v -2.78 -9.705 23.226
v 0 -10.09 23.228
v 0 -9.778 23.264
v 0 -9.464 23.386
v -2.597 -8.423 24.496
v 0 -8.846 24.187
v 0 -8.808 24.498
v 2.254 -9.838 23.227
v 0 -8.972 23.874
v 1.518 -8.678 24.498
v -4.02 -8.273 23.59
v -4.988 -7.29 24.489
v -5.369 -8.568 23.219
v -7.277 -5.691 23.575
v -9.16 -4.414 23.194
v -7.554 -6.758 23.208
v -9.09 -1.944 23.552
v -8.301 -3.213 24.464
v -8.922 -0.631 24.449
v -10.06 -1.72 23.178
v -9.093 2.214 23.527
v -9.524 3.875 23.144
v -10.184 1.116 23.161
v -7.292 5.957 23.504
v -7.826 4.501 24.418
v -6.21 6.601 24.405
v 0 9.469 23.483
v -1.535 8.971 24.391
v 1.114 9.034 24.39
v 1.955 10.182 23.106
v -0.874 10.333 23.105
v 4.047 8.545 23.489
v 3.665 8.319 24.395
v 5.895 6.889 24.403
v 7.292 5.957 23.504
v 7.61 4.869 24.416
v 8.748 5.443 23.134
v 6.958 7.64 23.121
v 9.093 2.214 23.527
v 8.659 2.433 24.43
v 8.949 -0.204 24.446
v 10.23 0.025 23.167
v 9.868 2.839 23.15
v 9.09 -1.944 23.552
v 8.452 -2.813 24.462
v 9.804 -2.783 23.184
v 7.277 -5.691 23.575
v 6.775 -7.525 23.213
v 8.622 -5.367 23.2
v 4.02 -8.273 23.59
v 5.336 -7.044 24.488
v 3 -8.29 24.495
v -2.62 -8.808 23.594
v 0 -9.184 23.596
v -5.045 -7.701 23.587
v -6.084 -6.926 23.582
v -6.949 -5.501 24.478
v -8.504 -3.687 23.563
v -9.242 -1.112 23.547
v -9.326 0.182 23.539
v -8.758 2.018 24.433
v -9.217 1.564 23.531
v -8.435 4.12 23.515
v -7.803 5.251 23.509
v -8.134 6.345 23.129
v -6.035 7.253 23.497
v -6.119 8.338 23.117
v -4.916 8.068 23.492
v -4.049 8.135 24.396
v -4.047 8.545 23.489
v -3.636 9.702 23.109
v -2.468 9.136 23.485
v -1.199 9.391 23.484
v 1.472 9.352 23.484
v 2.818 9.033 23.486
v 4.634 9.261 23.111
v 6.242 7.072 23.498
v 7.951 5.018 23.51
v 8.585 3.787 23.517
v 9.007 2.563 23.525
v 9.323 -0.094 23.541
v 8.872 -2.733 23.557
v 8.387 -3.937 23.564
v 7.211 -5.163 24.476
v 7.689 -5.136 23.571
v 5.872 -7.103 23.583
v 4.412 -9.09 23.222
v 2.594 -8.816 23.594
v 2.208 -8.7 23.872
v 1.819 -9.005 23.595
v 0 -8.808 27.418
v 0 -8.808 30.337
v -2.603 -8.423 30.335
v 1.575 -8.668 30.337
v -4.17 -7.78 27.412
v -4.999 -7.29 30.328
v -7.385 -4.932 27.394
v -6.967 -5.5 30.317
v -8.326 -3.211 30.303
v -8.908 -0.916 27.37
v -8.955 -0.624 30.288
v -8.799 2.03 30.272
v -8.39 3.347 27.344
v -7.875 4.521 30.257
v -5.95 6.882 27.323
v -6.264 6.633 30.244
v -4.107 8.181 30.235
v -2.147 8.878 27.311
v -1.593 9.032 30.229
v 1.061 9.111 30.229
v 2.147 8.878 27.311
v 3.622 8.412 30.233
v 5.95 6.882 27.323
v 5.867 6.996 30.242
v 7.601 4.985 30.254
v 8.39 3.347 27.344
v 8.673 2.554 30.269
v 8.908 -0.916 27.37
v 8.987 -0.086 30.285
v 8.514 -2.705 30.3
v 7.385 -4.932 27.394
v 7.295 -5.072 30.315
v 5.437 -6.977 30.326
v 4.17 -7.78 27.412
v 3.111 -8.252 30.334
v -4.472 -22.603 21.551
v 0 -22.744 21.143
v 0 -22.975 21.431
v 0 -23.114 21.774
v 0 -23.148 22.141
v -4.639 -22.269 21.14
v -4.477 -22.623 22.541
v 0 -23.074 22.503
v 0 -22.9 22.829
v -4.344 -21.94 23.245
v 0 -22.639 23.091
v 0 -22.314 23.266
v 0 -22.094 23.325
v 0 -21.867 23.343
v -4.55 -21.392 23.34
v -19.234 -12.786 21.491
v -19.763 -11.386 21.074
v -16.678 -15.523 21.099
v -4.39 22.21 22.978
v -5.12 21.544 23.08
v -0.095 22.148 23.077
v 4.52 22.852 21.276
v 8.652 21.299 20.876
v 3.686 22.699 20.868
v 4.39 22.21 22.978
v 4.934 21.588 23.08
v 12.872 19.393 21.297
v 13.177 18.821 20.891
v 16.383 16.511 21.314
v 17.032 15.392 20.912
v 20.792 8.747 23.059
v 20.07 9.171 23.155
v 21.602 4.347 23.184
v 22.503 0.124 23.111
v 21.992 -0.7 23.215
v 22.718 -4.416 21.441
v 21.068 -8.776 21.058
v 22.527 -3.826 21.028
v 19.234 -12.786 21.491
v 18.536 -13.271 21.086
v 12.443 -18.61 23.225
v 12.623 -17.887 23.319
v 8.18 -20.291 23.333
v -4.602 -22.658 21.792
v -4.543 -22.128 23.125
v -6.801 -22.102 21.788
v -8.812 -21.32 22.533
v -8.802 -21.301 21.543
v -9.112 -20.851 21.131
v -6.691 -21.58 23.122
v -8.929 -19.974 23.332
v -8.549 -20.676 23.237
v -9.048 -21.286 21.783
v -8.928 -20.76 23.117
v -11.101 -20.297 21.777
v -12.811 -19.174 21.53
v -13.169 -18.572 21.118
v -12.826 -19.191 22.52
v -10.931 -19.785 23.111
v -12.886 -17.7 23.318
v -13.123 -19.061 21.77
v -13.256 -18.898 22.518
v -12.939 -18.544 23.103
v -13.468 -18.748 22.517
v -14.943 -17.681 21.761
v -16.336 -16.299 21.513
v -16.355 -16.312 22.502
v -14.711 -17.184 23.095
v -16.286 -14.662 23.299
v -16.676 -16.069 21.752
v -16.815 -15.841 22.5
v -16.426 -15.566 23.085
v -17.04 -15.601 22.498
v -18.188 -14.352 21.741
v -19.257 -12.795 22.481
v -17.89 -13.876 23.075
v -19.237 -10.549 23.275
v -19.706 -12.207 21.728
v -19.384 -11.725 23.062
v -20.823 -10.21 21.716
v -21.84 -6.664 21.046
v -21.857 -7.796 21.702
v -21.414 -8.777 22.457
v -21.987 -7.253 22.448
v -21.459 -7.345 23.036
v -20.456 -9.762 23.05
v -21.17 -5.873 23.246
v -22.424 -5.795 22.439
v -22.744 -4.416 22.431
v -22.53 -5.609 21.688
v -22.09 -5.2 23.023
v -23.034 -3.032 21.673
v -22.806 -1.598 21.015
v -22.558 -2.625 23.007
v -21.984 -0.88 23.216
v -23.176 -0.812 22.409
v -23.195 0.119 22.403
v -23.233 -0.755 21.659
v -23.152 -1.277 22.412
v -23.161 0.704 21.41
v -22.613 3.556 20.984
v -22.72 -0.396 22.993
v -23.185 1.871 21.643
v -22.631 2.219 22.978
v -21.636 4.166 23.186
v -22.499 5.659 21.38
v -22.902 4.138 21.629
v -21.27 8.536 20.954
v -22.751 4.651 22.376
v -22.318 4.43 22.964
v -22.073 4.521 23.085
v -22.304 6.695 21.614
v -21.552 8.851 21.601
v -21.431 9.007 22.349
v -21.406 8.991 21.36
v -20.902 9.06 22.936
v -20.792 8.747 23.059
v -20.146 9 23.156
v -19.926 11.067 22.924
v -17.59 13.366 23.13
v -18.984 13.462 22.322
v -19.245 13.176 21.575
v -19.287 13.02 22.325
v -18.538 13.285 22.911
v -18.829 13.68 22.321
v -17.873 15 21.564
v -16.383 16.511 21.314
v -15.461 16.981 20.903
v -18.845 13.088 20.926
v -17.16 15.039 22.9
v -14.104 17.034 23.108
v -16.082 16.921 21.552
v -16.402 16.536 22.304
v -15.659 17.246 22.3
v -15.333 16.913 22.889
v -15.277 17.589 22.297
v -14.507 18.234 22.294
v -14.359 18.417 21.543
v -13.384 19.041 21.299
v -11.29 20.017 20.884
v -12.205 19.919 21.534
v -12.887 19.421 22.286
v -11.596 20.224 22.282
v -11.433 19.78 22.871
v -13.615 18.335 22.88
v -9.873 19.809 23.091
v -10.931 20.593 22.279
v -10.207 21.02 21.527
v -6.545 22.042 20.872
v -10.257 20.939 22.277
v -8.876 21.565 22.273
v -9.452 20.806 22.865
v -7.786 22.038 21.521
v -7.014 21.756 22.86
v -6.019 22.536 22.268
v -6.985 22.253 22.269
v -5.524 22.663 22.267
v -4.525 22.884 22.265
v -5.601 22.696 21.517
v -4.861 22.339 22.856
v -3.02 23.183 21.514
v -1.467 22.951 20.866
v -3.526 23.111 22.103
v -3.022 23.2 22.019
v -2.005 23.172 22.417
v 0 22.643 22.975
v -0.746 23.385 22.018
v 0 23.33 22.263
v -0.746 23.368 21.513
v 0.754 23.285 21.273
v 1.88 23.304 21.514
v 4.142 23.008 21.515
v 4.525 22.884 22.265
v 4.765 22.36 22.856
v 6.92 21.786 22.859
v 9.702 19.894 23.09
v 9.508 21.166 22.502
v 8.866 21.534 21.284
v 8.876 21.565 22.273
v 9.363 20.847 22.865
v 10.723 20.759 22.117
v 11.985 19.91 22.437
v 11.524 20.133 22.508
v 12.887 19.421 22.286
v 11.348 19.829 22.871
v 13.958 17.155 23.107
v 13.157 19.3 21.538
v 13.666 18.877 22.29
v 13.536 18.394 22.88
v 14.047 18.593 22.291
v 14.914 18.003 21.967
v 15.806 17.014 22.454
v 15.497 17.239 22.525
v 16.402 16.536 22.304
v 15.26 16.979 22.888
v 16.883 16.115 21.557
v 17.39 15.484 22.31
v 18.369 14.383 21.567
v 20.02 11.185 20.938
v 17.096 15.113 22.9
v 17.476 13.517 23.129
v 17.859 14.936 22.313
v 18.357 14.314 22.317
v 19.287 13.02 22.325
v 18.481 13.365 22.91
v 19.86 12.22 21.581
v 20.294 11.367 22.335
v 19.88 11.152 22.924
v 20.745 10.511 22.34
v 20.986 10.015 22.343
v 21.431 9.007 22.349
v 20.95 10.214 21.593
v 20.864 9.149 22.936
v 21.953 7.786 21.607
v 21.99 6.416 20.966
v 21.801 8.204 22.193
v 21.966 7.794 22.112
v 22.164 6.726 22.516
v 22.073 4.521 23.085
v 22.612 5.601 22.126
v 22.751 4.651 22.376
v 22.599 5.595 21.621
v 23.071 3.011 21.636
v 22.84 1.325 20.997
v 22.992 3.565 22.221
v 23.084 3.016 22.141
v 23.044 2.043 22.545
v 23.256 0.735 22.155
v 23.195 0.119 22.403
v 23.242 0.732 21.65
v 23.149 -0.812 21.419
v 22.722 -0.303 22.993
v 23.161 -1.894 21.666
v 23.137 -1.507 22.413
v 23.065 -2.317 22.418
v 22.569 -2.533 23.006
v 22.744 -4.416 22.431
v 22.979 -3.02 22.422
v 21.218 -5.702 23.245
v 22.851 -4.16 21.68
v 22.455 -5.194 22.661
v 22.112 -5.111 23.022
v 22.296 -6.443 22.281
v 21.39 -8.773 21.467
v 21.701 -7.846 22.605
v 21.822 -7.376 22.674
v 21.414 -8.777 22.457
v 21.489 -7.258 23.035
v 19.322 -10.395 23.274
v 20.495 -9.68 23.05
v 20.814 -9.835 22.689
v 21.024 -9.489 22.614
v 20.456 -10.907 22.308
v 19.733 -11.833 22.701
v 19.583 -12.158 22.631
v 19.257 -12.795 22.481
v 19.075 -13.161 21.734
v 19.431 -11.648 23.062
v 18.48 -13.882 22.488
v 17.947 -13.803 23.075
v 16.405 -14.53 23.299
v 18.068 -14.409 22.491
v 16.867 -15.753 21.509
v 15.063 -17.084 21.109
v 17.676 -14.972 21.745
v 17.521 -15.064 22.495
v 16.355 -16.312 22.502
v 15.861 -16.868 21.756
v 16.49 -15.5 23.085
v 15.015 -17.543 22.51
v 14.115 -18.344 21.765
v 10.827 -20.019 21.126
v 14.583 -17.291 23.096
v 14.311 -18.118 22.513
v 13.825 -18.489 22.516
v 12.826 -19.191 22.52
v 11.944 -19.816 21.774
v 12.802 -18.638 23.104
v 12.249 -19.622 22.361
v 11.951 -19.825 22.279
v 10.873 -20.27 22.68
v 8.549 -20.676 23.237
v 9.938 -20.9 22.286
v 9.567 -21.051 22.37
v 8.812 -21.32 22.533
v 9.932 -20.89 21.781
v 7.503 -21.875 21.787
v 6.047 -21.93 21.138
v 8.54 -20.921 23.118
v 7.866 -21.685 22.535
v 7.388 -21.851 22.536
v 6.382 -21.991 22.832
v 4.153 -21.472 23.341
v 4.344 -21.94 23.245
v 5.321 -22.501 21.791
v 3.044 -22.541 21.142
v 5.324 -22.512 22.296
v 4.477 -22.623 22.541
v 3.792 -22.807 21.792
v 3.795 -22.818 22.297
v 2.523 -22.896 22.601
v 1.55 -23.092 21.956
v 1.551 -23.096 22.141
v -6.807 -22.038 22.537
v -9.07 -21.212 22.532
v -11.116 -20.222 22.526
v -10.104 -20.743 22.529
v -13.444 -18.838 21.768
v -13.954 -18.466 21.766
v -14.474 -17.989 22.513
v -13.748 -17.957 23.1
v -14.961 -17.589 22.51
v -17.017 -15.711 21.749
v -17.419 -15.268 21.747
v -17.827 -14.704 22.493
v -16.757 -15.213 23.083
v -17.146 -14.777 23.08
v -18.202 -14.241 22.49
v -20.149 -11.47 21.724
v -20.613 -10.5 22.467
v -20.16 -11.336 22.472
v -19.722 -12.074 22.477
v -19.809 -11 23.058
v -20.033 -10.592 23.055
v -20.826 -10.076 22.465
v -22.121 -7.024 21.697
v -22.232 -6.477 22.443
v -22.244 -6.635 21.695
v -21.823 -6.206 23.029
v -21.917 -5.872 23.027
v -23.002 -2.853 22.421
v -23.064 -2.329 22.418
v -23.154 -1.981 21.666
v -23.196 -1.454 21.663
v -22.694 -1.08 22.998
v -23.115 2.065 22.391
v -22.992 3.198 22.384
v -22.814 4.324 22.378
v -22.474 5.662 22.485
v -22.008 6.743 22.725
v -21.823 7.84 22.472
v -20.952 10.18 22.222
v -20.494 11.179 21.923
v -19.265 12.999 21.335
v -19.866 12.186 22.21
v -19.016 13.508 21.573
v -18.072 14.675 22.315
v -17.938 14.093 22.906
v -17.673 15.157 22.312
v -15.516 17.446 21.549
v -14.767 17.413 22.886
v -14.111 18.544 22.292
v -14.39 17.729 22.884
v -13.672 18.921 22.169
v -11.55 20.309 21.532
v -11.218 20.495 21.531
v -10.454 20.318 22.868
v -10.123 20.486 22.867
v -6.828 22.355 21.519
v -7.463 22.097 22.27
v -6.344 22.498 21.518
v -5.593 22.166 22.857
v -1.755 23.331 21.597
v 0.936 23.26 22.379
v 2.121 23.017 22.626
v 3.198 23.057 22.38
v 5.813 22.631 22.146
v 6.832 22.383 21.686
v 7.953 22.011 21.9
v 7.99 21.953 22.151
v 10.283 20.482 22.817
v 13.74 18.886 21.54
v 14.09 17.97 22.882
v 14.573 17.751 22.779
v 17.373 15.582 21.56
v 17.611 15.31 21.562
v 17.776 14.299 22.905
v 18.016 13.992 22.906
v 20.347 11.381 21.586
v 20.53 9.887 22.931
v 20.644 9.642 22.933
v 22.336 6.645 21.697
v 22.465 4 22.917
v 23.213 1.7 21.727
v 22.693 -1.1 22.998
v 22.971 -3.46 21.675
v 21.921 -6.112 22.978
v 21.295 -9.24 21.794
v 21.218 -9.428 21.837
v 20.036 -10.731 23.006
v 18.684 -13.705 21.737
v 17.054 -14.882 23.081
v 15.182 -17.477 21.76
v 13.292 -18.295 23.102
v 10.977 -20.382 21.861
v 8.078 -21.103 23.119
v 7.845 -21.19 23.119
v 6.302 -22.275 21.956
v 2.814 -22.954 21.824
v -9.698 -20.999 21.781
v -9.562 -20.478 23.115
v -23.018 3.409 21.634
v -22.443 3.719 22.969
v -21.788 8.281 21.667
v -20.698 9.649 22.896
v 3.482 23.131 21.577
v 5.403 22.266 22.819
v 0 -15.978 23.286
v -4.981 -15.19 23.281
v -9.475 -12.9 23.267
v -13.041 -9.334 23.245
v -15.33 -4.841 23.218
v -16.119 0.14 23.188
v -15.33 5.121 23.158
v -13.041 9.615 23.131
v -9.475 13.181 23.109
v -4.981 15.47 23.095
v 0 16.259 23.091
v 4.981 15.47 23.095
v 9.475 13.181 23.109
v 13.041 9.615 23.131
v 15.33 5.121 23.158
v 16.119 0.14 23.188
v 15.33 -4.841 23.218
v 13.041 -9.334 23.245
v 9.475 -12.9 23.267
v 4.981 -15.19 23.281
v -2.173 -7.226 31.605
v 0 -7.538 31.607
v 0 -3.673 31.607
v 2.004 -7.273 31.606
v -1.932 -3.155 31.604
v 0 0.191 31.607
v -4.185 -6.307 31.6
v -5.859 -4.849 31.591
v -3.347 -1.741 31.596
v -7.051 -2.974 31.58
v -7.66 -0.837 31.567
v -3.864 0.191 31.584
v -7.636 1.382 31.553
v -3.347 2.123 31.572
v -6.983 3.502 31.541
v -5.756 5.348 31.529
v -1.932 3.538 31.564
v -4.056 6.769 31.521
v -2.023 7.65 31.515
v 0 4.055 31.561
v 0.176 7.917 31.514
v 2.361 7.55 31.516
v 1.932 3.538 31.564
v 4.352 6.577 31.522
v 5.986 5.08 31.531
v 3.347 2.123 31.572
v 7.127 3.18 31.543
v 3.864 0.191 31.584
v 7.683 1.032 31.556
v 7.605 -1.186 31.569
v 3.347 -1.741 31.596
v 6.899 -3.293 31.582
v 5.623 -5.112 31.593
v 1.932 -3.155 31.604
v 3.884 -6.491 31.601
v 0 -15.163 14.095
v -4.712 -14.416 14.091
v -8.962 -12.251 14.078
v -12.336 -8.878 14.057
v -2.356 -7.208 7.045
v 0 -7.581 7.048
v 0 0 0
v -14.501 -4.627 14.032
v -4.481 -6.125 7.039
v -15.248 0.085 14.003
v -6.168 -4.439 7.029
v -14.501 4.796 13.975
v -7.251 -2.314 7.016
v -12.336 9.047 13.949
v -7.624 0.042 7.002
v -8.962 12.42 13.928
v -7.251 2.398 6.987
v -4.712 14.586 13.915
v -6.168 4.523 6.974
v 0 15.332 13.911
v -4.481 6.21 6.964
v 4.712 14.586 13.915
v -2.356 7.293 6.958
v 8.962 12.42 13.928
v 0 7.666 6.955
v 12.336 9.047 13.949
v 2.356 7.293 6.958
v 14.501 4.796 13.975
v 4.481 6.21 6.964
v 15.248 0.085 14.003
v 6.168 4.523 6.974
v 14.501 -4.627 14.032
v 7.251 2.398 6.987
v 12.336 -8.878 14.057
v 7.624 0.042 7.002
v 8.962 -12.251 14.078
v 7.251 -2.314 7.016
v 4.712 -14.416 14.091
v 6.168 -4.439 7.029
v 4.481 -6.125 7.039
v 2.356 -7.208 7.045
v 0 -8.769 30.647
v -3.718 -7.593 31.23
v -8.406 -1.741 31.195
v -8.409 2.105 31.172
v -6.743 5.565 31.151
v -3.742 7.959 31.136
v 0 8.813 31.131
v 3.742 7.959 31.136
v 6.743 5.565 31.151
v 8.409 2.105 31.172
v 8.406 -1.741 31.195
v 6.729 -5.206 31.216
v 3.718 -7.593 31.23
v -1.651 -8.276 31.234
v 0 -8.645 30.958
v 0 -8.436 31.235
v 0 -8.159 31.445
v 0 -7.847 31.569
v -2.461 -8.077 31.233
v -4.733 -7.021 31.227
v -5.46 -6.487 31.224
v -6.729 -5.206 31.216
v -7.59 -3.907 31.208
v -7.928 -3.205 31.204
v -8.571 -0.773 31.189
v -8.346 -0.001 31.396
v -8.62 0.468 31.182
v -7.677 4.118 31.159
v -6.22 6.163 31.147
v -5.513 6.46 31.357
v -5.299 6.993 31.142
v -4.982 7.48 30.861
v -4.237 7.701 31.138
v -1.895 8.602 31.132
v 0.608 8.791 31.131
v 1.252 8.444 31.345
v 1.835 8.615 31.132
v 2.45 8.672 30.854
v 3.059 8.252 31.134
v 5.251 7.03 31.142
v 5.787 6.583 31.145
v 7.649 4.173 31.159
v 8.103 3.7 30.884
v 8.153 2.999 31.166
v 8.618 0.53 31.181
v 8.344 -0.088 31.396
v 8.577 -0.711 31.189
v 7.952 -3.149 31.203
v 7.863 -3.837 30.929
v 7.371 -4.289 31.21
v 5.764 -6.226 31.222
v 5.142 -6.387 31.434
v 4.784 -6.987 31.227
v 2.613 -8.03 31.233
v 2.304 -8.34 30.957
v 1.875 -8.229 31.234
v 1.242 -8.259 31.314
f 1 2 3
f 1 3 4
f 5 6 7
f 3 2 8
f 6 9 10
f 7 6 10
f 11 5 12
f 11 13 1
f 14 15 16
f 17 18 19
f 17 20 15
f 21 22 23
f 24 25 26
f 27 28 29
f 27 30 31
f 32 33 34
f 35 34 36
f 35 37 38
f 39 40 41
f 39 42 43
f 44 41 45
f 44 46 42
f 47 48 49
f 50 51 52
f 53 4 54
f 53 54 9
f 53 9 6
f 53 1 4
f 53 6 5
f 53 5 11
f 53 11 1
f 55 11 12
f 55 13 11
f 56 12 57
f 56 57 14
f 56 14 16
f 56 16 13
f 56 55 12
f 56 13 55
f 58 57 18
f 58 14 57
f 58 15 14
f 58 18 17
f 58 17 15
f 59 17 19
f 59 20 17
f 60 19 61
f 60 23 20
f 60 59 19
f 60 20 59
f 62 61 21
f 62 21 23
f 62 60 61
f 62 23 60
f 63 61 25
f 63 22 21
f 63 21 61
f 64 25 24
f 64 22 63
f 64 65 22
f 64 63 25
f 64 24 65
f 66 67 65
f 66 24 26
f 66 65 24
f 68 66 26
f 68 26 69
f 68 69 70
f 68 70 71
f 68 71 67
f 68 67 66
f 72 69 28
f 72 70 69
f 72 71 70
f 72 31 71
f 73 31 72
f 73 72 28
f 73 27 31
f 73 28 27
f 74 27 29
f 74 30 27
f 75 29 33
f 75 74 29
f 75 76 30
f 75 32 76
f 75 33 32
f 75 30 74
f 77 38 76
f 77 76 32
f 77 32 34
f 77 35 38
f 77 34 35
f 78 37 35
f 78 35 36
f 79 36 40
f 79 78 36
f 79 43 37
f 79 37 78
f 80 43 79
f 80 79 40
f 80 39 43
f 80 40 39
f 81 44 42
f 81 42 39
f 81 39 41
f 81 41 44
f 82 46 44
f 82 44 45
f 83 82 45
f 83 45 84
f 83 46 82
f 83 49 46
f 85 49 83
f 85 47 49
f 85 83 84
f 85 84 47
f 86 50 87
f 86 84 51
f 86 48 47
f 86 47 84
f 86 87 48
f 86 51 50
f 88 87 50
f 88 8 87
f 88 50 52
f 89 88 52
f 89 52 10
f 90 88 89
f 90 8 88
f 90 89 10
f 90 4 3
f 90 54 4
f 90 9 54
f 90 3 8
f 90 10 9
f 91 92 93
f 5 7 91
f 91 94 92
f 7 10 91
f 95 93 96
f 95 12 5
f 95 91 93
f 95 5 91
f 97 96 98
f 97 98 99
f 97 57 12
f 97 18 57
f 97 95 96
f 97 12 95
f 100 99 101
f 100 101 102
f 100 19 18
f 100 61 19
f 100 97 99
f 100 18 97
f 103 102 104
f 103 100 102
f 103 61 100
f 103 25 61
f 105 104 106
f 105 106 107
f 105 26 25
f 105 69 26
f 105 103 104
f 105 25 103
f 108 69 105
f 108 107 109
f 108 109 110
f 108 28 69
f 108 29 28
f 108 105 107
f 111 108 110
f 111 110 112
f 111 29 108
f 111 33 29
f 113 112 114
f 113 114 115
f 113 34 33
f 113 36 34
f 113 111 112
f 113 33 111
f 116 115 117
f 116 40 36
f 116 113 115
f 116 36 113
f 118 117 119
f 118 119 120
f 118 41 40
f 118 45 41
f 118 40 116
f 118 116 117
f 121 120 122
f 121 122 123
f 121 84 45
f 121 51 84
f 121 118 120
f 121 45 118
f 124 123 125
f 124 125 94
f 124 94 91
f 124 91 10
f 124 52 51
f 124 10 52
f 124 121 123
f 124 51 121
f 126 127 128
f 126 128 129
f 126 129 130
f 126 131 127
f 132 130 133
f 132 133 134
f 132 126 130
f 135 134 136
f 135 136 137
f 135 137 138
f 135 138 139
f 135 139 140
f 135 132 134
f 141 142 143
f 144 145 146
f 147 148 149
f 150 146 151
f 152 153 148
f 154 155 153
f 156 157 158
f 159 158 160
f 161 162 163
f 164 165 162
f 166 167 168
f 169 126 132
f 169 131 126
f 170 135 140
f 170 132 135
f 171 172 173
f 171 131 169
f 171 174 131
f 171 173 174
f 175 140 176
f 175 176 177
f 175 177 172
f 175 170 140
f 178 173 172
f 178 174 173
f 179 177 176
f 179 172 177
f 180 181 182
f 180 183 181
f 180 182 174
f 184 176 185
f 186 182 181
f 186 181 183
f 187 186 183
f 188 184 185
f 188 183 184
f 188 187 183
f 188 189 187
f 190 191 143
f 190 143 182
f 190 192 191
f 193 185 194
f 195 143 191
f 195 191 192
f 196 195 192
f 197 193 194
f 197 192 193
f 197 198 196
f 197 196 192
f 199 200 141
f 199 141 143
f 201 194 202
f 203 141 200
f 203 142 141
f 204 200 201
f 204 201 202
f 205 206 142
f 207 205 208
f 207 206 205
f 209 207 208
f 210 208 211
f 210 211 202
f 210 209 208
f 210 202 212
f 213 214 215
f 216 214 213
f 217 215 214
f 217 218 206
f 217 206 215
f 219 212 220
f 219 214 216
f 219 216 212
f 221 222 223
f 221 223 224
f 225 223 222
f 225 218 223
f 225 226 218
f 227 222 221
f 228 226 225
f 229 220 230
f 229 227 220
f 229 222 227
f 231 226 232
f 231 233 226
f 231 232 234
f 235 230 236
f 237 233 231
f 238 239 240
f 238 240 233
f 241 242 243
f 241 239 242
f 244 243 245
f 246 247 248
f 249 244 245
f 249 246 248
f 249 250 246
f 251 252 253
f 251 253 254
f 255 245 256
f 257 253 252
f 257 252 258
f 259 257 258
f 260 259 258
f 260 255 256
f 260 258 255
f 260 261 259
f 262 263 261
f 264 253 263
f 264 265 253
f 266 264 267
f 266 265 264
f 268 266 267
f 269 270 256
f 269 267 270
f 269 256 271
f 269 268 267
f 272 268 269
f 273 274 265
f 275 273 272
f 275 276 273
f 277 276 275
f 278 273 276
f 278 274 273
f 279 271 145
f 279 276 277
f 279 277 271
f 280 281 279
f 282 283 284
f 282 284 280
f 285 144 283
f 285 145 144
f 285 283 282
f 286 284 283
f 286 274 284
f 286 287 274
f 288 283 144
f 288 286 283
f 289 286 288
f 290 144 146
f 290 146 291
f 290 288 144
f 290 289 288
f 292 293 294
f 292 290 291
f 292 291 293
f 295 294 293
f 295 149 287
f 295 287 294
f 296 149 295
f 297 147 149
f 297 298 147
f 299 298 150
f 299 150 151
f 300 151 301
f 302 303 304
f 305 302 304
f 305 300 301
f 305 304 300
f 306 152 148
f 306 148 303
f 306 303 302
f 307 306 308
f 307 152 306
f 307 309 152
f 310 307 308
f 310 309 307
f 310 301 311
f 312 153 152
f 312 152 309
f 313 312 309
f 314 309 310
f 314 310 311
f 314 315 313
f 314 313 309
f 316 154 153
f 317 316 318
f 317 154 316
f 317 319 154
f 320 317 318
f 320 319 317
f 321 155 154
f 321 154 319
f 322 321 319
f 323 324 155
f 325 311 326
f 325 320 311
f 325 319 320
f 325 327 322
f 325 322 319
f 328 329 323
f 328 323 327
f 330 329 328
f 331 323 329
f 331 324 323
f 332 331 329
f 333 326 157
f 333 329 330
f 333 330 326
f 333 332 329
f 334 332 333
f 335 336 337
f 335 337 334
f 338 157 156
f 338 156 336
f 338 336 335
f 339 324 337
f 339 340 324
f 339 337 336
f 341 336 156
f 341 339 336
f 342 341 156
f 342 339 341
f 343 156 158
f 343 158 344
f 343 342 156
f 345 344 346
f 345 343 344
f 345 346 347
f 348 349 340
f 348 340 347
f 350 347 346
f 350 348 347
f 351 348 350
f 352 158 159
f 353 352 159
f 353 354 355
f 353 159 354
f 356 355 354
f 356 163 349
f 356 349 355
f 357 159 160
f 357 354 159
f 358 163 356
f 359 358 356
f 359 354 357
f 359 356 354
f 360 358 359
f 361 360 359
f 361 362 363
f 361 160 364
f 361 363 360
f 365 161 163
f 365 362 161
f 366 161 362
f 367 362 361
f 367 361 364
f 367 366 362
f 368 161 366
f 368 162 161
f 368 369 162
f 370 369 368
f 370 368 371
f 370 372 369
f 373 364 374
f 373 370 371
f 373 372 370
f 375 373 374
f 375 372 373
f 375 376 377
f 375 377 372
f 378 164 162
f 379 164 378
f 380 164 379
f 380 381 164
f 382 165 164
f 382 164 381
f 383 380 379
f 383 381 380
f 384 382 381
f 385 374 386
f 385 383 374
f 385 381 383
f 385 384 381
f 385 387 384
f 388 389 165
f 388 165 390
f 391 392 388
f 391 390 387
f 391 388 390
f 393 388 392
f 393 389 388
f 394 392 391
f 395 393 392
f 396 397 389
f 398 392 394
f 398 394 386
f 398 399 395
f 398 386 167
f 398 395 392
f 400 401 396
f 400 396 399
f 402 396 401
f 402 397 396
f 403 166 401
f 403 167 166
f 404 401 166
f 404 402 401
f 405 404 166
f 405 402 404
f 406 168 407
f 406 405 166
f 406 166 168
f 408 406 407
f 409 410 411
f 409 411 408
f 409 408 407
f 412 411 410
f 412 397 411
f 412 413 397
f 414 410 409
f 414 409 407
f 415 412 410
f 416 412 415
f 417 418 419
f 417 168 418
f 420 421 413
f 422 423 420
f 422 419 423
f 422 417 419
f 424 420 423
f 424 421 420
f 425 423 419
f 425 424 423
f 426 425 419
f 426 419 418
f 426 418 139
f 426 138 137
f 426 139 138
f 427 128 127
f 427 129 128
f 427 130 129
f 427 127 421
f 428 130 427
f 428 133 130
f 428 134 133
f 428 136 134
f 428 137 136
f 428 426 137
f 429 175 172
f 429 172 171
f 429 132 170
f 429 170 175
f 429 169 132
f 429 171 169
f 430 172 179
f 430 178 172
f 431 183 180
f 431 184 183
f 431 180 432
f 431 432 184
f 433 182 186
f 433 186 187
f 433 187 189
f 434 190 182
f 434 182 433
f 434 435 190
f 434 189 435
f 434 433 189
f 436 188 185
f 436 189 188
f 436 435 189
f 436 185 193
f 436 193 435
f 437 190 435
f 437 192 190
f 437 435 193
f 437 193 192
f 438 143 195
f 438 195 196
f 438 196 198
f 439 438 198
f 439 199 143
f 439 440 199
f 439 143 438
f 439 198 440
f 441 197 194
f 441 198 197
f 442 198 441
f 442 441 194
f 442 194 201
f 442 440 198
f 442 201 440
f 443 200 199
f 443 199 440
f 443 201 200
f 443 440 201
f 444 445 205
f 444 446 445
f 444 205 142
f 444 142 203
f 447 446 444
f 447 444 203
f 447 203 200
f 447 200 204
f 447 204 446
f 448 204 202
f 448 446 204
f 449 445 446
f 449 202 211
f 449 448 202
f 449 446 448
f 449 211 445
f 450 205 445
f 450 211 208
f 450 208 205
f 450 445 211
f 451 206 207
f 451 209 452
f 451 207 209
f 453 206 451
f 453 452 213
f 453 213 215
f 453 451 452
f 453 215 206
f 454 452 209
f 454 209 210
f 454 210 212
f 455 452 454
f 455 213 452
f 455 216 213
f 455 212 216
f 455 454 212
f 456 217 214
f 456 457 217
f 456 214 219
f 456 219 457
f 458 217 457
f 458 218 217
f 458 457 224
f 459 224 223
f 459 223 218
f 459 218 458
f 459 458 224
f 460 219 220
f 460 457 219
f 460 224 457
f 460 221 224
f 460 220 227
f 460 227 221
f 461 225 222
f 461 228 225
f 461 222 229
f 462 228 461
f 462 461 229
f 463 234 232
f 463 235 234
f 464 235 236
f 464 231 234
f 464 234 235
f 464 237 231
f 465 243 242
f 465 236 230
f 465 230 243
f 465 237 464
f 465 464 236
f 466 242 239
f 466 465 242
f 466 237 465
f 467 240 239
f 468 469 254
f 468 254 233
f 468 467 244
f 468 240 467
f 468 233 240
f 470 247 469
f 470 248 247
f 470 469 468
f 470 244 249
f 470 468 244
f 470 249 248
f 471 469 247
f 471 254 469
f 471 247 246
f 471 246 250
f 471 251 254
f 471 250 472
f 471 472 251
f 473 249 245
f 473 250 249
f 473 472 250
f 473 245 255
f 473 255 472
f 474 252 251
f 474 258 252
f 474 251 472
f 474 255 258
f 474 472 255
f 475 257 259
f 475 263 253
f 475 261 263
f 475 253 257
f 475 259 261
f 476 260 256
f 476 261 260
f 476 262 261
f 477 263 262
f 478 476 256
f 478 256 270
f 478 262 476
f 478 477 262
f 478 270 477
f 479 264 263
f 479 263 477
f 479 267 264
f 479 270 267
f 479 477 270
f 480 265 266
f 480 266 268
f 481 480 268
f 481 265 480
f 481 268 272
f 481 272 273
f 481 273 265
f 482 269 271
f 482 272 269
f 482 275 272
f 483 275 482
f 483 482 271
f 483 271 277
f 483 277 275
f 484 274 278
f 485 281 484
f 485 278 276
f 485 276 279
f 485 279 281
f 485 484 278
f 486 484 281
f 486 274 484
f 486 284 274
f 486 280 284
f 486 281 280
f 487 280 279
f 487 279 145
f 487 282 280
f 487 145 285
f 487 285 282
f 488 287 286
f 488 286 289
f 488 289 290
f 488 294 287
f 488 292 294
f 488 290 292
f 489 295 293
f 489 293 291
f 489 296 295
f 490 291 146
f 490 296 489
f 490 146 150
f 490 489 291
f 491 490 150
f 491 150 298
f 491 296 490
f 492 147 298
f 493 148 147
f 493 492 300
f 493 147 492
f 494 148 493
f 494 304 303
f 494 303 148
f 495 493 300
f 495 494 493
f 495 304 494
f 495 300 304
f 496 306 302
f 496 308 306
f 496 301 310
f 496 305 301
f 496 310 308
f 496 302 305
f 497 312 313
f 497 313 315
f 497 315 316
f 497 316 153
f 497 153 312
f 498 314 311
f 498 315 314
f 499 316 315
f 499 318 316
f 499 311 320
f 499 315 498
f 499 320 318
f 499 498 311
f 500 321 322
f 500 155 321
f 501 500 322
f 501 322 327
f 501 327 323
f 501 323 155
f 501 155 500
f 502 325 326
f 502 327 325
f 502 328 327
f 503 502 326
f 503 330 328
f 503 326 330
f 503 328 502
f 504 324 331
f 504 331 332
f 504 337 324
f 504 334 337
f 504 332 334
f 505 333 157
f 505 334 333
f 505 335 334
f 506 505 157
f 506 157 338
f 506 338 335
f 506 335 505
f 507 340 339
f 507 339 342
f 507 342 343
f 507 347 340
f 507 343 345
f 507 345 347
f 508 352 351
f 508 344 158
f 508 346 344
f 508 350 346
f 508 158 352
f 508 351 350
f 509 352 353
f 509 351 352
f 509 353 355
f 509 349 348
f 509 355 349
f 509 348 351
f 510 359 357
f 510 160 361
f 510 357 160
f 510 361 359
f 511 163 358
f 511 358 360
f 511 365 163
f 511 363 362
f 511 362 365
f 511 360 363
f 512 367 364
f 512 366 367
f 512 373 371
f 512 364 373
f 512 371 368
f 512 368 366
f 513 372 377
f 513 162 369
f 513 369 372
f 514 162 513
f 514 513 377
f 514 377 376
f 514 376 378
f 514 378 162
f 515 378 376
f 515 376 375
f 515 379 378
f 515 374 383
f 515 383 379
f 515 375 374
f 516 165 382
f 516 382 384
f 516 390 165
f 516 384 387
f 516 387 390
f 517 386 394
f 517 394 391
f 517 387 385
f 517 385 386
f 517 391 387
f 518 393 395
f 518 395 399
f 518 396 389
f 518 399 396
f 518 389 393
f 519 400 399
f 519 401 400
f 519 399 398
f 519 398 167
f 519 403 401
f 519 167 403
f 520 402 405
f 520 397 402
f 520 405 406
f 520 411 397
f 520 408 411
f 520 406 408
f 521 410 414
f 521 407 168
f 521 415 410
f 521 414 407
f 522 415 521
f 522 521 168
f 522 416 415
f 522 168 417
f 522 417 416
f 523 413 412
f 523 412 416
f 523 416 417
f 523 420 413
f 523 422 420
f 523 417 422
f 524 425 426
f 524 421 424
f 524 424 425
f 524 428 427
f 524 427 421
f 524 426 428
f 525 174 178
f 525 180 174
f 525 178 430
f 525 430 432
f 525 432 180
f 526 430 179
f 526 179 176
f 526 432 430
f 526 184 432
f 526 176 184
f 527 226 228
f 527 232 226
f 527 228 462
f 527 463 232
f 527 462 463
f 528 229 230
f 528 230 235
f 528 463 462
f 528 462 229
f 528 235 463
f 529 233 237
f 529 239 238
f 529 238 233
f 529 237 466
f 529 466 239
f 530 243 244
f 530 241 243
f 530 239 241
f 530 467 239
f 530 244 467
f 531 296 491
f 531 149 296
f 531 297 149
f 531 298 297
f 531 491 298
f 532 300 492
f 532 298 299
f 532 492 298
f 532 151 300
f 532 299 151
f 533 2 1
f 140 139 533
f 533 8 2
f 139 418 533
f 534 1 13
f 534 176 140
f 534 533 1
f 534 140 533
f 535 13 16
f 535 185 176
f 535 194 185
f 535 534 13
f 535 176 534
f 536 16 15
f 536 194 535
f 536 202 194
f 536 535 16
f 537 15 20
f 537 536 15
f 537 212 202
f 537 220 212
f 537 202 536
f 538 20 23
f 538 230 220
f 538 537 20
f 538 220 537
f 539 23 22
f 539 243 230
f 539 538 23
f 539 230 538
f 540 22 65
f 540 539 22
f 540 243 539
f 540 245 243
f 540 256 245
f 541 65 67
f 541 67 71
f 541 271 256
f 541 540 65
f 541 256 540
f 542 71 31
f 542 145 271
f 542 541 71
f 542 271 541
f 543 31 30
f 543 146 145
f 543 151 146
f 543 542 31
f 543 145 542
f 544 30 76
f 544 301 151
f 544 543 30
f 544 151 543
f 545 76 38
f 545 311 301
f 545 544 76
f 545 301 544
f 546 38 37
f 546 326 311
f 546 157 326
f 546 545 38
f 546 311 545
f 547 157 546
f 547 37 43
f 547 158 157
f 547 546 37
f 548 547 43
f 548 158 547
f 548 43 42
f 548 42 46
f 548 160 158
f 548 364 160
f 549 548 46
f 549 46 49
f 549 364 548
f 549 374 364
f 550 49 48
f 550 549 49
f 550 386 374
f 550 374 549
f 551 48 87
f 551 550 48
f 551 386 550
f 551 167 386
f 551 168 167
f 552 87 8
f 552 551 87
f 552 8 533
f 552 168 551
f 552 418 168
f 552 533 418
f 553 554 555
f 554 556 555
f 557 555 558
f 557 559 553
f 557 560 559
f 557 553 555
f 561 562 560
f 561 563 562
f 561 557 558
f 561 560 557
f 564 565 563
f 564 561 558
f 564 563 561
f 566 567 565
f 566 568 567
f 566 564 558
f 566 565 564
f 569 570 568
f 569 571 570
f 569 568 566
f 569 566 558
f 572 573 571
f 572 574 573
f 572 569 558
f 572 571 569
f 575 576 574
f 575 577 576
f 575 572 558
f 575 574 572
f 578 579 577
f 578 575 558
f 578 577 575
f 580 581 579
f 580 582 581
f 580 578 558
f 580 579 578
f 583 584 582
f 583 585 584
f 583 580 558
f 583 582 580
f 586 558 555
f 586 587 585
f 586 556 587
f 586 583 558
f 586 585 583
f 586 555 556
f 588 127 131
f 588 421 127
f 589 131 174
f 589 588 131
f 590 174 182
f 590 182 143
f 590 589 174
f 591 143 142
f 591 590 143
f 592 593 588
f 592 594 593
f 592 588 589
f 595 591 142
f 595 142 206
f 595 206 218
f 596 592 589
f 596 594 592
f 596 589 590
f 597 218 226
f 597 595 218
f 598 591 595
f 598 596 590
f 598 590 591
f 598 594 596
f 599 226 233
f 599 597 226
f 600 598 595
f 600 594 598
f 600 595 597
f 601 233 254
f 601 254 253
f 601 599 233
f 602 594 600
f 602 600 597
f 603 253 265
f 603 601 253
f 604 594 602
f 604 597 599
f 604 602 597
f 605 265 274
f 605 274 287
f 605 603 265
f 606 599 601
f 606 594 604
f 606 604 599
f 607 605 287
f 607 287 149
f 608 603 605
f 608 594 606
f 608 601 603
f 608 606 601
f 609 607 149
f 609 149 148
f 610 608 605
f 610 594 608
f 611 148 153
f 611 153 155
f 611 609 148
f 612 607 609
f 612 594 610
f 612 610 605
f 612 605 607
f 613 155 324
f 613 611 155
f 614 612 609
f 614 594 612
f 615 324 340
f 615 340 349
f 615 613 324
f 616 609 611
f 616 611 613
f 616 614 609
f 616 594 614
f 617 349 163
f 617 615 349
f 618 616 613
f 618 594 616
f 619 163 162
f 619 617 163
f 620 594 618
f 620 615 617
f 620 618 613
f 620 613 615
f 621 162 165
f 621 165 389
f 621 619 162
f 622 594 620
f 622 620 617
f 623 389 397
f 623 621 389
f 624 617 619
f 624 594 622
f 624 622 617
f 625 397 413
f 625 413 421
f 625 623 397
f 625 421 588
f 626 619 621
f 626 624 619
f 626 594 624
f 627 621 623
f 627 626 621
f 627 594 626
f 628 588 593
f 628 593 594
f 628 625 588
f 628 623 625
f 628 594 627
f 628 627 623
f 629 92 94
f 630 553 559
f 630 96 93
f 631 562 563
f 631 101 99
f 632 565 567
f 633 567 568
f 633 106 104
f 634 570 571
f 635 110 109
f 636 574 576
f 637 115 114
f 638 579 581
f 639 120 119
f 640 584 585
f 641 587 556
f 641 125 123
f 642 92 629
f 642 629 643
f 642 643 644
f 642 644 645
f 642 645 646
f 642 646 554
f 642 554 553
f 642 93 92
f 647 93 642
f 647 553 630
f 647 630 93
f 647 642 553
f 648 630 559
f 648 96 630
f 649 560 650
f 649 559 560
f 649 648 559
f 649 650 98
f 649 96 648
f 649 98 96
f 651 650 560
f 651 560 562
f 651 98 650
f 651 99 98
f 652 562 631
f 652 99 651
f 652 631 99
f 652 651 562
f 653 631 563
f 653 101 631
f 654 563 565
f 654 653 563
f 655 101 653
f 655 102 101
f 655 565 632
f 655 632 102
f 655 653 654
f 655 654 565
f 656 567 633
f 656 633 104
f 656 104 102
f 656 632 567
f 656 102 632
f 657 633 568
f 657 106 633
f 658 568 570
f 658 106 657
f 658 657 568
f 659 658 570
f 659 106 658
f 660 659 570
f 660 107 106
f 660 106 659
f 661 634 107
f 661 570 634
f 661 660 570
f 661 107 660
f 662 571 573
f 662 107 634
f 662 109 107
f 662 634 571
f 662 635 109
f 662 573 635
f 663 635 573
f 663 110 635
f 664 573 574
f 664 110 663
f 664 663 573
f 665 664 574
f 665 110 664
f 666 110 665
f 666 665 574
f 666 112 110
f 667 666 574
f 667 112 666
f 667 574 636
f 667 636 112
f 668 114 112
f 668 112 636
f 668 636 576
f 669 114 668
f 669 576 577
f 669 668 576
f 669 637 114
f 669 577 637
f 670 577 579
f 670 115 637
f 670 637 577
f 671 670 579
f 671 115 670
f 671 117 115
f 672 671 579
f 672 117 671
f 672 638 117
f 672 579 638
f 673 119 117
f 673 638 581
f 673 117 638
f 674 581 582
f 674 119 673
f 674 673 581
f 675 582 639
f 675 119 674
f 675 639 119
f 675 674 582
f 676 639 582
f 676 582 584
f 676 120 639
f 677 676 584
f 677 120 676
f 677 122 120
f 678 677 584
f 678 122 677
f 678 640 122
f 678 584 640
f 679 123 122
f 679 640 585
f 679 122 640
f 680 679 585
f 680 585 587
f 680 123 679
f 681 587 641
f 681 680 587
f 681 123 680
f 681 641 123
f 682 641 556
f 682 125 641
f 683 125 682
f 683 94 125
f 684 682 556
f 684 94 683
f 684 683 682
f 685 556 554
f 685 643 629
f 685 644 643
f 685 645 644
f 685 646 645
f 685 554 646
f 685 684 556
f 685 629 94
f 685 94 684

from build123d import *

# Parameters (mm, degrees)
F4_R = 1.27
F5_R = 1.27


# Not quite as in the source:
# - the program builds the solid bodies; features that only make, move or delete a surface that nothing else refers to are left out


with BuildPart() as f1:
    # F0 (on Right) → F1 (revolve)
    with BuildSketch(Plane.YZ):
        Polygon((-25.1451414078, 23.3748648316), (0, 0), (0.1911758445, 31.6073447466), (-8.8075501844, 31.6073447466), (-8.8075501844, 23.2158955187), align=None)
    revolve(axis=Axis((0, 0.0955879223, 15.8036723733), (0, -0.006048352, -0.9999817086)))

    # F4
    f4_edges = [f1.edges().sort_by_distance(p)[0] for p in [
        (0, 25.426055, 23.068987),
    ]]
    fillet(f4_edges, radius=F4_R)

    # F5
    f5_edges = [f1.edges().sort_by_distance(p)[0] for p in [
        (0, 9.189243, 31.498492),
        (0, 9.087736, 23.107657),
        (0, -8.80755, 27.41162),
        (0, -15.337301, 23.279432),
        (0, 22.14782, 23.076746),
    ]]
    fillet(f5_edges, radius=F5_R)


solid = f1.part
